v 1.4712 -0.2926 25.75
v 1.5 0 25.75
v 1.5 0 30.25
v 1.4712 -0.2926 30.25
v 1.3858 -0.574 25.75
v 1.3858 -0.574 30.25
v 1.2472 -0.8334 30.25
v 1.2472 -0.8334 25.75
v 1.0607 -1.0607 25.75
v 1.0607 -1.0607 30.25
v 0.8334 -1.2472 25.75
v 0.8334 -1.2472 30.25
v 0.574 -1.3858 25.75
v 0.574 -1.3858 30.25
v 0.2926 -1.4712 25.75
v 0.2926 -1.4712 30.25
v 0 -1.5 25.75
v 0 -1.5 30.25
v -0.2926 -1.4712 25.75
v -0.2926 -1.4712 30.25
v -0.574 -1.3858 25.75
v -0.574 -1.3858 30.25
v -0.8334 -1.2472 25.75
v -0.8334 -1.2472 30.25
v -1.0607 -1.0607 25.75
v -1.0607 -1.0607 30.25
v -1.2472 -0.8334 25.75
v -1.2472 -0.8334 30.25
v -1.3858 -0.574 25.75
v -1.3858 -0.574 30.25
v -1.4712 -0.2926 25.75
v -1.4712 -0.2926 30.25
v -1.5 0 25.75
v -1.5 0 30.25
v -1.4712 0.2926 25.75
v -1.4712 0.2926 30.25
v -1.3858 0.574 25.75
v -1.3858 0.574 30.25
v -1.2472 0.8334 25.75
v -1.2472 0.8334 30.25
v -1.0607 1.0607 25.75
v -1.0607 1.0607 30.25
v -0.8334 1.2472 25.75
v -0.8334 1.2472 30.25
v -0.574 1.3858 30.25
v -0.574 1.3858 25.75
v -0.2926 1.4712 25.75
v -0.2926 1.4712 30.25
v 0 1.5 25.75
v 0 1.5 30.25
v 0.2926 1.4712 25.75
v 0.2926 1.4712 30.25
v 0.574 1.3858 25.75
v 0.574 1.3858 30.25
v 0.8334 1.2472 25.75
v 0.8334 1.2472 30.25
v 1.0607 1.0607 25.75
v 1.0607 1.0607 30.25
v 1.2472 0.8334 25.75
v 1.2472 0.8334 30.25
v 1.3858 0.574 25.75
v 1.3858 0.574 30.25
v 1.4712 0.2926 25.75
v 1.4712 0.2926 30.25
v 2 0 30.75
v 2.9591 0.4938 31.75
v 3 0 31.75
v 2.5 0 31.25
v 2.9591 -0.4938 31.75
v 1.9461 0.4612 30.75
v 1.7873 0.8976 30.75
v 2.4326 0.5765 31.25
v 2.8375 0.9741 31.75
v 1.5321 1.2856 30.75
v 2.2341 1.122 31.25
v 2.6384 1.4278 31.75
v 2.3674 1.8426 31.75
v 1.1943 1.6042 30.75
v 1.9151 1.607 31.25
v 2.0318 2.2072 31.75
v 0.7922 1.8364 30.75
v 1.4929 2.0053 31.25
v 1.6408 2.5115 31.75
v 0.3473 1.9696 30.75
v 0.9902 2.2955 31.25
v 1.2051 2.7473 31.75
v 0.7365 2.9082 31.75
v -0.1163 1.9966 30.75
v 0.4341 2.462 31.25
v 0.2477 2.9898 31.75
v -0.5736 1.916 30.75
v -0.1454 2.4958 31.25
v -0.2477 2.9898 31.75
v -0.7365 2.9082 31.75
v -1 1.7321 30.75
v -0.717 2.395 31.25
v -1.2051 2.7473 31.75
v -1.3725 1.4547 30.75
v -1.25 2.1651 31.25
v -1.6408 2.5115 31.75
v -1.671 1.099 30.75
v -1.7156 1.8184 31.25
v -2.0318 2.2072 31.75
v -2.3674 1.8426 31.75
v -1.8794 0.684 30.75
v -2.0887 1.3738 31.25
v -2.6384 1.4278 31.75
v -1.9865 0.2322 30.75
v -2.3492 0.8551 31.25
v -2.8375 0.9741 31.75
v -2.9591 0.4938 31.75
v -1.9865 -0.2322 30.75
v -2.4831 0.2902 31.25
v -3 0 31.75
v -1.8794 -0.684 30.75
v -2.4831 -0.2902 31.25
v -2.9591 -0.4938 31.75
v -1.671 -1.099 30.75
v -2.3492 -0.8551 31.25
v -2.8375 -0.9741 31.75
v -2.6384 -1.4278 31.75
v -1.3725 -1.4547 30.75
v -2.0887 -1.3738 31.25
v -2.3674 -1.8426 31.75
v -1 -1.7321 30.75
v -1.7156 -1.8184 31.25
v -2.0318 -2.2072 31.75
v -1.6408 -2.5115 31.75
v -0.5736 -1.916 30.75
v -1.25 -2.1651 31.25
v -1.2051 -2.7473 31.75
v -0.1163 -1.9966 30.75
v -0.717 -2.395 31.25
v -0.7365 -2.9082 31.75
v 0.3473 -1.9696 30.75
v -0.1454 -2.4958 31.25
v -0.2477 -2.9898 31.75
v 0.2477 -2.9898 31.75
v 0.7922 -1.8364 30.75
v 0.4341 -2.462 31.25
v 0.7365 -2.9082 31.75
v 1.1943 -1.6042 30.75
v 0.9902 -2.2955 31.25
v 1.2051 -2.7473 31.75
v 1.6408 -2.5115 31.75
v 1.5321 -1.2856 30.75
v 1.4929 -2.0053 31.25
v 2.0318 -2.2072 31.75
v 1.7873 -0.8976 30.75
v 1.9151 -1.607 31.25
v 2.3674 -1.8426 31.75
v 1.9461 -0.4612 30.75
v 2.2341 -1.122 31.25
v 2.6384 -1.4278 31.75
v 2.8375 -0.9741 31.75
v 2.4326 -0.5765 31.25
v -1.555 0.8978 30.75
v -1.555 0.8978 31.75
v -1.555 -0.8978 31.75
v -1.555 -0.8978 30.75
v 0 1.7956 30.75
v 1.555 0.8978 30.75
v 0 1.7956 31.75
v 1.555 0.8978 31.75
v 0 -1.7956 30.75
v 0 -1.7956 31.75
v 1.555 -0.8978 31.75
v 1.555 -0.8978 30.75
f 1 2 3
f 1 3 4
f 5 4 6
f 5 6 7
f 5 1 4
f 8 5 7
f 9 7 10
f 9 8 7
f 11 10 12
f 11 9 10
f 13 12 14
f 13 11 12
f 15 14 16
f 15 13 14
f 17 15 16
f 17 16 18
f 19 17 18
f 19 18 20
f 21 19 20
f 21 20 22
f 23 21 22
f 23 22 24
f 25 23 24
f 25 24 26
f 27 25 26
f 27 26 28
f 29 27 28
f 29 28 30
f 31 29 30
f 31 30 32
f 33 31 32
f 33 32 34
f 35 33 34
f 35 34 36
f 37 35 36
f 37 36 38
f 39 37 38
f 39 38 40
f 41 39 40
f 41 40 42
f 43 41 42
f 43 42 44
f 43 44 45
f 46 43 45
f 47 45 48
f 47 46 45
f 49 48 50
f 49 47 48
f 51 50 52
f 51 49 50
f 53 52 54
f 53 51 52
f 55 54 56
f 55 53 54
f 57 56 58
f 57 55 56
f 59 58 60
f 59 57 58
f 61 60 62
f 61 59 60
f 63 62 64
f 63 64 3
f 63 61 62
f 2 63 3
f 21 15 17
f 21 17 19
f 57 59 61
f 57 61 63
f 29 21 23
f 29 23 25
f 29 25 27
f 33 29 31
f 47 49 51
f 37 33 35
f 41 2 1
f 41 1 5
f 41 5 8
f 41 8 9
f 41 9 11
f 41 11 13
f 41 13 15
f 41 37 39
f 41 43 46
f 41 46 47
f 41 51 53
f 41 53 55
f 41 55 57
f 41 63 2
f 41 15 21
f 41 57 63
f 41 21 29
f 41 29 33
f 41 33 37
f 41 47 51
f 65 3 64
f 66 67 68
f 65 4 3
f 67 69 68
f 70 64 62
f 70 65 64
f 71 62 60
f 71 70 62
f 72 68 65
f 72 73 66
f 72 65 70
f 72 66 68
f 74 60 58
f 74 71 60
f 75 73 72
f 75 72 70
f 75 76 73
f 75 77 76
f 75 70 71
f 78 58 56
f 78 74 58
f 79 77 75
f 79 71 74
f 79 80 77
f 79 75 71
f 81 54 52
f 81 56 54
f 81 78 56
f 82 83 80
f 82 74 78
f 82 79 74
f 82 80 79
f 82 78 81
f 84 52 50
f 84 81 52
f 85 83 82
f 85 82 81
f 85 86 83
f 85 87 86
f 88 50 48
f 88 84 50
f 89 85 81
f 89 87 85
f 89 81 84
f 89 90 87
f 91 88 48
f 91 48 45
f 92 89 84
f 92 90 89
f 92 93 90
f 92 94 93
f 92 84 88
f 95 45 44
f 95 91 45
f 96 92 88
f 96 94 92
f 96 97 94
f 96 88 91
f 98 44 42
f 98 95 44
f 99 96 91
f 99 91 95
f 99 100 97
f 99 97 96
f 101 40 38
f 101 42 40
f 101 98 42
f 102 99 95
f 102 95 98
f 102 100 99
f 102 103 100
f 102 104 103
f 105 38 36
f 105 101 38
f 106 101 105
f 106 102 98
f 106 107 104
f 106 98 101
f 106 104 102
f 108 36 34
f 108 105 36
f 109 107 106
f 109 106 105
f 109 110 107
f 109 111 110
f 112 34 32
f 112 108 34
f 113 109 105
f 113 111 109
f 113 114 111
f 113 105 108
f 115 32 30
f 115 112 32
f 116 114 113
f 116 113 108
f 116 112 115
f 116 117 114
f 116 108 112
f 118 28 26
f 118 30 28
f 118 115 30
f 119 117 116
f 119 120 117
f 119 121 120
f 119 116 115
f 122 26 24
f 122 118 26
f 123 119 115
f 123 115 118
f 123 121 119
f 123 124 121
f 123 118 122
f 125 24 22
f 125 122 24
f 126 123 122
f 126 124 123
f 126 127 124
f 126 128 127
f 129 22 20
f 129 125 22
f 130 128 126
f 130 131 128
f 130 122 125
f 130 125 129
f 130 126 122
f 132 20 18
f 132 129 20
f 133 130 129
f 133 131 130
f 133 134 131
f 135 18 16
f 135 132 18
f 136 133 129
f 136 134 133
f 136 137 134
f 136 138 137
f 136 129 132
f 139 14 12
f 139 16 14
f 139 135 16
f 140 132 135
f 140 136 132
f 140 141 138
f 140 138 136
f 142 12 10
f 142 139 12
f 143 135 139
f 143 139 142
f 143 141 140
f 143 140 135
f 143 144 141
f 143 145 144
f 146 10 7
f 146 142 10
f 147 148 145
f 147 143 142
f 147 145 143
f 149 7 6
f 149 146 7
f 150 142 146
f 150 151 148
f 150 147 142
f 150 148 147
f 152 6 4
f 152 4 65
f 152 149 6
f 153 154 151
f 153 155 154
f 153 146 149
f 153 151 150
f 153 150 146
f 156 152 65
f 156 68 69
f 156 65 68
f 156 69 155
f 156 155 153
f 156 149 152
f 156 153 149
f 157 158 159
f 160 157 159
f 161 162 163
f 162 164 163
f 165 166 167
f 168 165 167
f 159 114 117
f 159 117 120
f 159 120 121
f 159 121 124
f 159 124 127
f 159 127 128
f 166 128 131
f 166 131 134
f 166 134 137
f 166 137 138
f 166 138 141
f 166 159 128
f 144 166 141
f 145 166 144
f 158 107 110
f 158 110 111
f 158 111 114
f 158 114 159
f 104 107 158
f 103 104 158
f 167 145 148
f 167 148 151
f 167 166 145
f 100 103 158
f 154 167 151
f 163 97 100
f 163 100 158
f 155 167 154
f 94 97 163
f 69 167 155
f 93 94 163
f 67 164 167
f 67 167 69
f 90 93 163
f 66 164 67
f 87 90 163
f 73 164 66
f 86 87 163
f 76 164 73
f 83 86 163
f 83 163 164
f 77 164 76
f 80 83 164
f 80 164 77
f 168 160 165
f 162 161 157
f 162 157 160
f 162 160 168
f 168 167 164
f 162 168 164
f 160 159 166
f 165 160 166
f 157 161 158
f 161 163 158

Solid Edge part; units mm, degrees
sketch "Sketch1" plane through (0, 0, 0) normal (0, 0, 1) x (1, 0, 0)
  circle A0 centre (0, 0) radius 1.5
extrude "Protrusion1" add sketch "Sketch1" along normal blind 30
sketch "Sketch2" plane through (0, 0, 30) normal (0, 0, 1) x (1, 0, 0)
  circle A0 centre (0, 0) radius 3
extrude "ExtrudedProtrusion_2" add sketch "Sketch2" along normal blind 1.75
chamfer "Chamfer_1" distance 1.75 angle 45 1 edges at (-3, 0, 30)
sketch "Sketch3" plane through (0, 0, 31.75) normal (0, 0, 1) x (0, 1, 0)
  line L0 (0.8978, -1.555) -> (1.7956, 0)
  line L1 (1.7956, 0) -> (0.8978, 1.555)
  line L2 (0.8978, 1.555) -> (-0.8978, 1.555)
  line L3 (-0.8978, 1.555) -> (-1.7956, 0)
  line L4 (-1.7956, 0) -> (-0.8978, -1.555)
  line L5 (-0.8978, -1.555) -> (0.8978, -1.555)
extrude "ExtrudedCutout_1" cut sketch "Sketch3" against normal blind 1
sketch "Sketch4" plane through (0, 0, 0) normal (0, 0, -1) x (0, 1, 0)
  circle A0 centre (0, 0) radius 1.9215
extrude "ExtrudedCutout_2" cut sketch "Sketch4" against normal blind 25.75
revolve "RevolvedCutout1" [suppressed]
fillet "Round_1" [suppressed]
properties material "Iron, grey cast type 20"
